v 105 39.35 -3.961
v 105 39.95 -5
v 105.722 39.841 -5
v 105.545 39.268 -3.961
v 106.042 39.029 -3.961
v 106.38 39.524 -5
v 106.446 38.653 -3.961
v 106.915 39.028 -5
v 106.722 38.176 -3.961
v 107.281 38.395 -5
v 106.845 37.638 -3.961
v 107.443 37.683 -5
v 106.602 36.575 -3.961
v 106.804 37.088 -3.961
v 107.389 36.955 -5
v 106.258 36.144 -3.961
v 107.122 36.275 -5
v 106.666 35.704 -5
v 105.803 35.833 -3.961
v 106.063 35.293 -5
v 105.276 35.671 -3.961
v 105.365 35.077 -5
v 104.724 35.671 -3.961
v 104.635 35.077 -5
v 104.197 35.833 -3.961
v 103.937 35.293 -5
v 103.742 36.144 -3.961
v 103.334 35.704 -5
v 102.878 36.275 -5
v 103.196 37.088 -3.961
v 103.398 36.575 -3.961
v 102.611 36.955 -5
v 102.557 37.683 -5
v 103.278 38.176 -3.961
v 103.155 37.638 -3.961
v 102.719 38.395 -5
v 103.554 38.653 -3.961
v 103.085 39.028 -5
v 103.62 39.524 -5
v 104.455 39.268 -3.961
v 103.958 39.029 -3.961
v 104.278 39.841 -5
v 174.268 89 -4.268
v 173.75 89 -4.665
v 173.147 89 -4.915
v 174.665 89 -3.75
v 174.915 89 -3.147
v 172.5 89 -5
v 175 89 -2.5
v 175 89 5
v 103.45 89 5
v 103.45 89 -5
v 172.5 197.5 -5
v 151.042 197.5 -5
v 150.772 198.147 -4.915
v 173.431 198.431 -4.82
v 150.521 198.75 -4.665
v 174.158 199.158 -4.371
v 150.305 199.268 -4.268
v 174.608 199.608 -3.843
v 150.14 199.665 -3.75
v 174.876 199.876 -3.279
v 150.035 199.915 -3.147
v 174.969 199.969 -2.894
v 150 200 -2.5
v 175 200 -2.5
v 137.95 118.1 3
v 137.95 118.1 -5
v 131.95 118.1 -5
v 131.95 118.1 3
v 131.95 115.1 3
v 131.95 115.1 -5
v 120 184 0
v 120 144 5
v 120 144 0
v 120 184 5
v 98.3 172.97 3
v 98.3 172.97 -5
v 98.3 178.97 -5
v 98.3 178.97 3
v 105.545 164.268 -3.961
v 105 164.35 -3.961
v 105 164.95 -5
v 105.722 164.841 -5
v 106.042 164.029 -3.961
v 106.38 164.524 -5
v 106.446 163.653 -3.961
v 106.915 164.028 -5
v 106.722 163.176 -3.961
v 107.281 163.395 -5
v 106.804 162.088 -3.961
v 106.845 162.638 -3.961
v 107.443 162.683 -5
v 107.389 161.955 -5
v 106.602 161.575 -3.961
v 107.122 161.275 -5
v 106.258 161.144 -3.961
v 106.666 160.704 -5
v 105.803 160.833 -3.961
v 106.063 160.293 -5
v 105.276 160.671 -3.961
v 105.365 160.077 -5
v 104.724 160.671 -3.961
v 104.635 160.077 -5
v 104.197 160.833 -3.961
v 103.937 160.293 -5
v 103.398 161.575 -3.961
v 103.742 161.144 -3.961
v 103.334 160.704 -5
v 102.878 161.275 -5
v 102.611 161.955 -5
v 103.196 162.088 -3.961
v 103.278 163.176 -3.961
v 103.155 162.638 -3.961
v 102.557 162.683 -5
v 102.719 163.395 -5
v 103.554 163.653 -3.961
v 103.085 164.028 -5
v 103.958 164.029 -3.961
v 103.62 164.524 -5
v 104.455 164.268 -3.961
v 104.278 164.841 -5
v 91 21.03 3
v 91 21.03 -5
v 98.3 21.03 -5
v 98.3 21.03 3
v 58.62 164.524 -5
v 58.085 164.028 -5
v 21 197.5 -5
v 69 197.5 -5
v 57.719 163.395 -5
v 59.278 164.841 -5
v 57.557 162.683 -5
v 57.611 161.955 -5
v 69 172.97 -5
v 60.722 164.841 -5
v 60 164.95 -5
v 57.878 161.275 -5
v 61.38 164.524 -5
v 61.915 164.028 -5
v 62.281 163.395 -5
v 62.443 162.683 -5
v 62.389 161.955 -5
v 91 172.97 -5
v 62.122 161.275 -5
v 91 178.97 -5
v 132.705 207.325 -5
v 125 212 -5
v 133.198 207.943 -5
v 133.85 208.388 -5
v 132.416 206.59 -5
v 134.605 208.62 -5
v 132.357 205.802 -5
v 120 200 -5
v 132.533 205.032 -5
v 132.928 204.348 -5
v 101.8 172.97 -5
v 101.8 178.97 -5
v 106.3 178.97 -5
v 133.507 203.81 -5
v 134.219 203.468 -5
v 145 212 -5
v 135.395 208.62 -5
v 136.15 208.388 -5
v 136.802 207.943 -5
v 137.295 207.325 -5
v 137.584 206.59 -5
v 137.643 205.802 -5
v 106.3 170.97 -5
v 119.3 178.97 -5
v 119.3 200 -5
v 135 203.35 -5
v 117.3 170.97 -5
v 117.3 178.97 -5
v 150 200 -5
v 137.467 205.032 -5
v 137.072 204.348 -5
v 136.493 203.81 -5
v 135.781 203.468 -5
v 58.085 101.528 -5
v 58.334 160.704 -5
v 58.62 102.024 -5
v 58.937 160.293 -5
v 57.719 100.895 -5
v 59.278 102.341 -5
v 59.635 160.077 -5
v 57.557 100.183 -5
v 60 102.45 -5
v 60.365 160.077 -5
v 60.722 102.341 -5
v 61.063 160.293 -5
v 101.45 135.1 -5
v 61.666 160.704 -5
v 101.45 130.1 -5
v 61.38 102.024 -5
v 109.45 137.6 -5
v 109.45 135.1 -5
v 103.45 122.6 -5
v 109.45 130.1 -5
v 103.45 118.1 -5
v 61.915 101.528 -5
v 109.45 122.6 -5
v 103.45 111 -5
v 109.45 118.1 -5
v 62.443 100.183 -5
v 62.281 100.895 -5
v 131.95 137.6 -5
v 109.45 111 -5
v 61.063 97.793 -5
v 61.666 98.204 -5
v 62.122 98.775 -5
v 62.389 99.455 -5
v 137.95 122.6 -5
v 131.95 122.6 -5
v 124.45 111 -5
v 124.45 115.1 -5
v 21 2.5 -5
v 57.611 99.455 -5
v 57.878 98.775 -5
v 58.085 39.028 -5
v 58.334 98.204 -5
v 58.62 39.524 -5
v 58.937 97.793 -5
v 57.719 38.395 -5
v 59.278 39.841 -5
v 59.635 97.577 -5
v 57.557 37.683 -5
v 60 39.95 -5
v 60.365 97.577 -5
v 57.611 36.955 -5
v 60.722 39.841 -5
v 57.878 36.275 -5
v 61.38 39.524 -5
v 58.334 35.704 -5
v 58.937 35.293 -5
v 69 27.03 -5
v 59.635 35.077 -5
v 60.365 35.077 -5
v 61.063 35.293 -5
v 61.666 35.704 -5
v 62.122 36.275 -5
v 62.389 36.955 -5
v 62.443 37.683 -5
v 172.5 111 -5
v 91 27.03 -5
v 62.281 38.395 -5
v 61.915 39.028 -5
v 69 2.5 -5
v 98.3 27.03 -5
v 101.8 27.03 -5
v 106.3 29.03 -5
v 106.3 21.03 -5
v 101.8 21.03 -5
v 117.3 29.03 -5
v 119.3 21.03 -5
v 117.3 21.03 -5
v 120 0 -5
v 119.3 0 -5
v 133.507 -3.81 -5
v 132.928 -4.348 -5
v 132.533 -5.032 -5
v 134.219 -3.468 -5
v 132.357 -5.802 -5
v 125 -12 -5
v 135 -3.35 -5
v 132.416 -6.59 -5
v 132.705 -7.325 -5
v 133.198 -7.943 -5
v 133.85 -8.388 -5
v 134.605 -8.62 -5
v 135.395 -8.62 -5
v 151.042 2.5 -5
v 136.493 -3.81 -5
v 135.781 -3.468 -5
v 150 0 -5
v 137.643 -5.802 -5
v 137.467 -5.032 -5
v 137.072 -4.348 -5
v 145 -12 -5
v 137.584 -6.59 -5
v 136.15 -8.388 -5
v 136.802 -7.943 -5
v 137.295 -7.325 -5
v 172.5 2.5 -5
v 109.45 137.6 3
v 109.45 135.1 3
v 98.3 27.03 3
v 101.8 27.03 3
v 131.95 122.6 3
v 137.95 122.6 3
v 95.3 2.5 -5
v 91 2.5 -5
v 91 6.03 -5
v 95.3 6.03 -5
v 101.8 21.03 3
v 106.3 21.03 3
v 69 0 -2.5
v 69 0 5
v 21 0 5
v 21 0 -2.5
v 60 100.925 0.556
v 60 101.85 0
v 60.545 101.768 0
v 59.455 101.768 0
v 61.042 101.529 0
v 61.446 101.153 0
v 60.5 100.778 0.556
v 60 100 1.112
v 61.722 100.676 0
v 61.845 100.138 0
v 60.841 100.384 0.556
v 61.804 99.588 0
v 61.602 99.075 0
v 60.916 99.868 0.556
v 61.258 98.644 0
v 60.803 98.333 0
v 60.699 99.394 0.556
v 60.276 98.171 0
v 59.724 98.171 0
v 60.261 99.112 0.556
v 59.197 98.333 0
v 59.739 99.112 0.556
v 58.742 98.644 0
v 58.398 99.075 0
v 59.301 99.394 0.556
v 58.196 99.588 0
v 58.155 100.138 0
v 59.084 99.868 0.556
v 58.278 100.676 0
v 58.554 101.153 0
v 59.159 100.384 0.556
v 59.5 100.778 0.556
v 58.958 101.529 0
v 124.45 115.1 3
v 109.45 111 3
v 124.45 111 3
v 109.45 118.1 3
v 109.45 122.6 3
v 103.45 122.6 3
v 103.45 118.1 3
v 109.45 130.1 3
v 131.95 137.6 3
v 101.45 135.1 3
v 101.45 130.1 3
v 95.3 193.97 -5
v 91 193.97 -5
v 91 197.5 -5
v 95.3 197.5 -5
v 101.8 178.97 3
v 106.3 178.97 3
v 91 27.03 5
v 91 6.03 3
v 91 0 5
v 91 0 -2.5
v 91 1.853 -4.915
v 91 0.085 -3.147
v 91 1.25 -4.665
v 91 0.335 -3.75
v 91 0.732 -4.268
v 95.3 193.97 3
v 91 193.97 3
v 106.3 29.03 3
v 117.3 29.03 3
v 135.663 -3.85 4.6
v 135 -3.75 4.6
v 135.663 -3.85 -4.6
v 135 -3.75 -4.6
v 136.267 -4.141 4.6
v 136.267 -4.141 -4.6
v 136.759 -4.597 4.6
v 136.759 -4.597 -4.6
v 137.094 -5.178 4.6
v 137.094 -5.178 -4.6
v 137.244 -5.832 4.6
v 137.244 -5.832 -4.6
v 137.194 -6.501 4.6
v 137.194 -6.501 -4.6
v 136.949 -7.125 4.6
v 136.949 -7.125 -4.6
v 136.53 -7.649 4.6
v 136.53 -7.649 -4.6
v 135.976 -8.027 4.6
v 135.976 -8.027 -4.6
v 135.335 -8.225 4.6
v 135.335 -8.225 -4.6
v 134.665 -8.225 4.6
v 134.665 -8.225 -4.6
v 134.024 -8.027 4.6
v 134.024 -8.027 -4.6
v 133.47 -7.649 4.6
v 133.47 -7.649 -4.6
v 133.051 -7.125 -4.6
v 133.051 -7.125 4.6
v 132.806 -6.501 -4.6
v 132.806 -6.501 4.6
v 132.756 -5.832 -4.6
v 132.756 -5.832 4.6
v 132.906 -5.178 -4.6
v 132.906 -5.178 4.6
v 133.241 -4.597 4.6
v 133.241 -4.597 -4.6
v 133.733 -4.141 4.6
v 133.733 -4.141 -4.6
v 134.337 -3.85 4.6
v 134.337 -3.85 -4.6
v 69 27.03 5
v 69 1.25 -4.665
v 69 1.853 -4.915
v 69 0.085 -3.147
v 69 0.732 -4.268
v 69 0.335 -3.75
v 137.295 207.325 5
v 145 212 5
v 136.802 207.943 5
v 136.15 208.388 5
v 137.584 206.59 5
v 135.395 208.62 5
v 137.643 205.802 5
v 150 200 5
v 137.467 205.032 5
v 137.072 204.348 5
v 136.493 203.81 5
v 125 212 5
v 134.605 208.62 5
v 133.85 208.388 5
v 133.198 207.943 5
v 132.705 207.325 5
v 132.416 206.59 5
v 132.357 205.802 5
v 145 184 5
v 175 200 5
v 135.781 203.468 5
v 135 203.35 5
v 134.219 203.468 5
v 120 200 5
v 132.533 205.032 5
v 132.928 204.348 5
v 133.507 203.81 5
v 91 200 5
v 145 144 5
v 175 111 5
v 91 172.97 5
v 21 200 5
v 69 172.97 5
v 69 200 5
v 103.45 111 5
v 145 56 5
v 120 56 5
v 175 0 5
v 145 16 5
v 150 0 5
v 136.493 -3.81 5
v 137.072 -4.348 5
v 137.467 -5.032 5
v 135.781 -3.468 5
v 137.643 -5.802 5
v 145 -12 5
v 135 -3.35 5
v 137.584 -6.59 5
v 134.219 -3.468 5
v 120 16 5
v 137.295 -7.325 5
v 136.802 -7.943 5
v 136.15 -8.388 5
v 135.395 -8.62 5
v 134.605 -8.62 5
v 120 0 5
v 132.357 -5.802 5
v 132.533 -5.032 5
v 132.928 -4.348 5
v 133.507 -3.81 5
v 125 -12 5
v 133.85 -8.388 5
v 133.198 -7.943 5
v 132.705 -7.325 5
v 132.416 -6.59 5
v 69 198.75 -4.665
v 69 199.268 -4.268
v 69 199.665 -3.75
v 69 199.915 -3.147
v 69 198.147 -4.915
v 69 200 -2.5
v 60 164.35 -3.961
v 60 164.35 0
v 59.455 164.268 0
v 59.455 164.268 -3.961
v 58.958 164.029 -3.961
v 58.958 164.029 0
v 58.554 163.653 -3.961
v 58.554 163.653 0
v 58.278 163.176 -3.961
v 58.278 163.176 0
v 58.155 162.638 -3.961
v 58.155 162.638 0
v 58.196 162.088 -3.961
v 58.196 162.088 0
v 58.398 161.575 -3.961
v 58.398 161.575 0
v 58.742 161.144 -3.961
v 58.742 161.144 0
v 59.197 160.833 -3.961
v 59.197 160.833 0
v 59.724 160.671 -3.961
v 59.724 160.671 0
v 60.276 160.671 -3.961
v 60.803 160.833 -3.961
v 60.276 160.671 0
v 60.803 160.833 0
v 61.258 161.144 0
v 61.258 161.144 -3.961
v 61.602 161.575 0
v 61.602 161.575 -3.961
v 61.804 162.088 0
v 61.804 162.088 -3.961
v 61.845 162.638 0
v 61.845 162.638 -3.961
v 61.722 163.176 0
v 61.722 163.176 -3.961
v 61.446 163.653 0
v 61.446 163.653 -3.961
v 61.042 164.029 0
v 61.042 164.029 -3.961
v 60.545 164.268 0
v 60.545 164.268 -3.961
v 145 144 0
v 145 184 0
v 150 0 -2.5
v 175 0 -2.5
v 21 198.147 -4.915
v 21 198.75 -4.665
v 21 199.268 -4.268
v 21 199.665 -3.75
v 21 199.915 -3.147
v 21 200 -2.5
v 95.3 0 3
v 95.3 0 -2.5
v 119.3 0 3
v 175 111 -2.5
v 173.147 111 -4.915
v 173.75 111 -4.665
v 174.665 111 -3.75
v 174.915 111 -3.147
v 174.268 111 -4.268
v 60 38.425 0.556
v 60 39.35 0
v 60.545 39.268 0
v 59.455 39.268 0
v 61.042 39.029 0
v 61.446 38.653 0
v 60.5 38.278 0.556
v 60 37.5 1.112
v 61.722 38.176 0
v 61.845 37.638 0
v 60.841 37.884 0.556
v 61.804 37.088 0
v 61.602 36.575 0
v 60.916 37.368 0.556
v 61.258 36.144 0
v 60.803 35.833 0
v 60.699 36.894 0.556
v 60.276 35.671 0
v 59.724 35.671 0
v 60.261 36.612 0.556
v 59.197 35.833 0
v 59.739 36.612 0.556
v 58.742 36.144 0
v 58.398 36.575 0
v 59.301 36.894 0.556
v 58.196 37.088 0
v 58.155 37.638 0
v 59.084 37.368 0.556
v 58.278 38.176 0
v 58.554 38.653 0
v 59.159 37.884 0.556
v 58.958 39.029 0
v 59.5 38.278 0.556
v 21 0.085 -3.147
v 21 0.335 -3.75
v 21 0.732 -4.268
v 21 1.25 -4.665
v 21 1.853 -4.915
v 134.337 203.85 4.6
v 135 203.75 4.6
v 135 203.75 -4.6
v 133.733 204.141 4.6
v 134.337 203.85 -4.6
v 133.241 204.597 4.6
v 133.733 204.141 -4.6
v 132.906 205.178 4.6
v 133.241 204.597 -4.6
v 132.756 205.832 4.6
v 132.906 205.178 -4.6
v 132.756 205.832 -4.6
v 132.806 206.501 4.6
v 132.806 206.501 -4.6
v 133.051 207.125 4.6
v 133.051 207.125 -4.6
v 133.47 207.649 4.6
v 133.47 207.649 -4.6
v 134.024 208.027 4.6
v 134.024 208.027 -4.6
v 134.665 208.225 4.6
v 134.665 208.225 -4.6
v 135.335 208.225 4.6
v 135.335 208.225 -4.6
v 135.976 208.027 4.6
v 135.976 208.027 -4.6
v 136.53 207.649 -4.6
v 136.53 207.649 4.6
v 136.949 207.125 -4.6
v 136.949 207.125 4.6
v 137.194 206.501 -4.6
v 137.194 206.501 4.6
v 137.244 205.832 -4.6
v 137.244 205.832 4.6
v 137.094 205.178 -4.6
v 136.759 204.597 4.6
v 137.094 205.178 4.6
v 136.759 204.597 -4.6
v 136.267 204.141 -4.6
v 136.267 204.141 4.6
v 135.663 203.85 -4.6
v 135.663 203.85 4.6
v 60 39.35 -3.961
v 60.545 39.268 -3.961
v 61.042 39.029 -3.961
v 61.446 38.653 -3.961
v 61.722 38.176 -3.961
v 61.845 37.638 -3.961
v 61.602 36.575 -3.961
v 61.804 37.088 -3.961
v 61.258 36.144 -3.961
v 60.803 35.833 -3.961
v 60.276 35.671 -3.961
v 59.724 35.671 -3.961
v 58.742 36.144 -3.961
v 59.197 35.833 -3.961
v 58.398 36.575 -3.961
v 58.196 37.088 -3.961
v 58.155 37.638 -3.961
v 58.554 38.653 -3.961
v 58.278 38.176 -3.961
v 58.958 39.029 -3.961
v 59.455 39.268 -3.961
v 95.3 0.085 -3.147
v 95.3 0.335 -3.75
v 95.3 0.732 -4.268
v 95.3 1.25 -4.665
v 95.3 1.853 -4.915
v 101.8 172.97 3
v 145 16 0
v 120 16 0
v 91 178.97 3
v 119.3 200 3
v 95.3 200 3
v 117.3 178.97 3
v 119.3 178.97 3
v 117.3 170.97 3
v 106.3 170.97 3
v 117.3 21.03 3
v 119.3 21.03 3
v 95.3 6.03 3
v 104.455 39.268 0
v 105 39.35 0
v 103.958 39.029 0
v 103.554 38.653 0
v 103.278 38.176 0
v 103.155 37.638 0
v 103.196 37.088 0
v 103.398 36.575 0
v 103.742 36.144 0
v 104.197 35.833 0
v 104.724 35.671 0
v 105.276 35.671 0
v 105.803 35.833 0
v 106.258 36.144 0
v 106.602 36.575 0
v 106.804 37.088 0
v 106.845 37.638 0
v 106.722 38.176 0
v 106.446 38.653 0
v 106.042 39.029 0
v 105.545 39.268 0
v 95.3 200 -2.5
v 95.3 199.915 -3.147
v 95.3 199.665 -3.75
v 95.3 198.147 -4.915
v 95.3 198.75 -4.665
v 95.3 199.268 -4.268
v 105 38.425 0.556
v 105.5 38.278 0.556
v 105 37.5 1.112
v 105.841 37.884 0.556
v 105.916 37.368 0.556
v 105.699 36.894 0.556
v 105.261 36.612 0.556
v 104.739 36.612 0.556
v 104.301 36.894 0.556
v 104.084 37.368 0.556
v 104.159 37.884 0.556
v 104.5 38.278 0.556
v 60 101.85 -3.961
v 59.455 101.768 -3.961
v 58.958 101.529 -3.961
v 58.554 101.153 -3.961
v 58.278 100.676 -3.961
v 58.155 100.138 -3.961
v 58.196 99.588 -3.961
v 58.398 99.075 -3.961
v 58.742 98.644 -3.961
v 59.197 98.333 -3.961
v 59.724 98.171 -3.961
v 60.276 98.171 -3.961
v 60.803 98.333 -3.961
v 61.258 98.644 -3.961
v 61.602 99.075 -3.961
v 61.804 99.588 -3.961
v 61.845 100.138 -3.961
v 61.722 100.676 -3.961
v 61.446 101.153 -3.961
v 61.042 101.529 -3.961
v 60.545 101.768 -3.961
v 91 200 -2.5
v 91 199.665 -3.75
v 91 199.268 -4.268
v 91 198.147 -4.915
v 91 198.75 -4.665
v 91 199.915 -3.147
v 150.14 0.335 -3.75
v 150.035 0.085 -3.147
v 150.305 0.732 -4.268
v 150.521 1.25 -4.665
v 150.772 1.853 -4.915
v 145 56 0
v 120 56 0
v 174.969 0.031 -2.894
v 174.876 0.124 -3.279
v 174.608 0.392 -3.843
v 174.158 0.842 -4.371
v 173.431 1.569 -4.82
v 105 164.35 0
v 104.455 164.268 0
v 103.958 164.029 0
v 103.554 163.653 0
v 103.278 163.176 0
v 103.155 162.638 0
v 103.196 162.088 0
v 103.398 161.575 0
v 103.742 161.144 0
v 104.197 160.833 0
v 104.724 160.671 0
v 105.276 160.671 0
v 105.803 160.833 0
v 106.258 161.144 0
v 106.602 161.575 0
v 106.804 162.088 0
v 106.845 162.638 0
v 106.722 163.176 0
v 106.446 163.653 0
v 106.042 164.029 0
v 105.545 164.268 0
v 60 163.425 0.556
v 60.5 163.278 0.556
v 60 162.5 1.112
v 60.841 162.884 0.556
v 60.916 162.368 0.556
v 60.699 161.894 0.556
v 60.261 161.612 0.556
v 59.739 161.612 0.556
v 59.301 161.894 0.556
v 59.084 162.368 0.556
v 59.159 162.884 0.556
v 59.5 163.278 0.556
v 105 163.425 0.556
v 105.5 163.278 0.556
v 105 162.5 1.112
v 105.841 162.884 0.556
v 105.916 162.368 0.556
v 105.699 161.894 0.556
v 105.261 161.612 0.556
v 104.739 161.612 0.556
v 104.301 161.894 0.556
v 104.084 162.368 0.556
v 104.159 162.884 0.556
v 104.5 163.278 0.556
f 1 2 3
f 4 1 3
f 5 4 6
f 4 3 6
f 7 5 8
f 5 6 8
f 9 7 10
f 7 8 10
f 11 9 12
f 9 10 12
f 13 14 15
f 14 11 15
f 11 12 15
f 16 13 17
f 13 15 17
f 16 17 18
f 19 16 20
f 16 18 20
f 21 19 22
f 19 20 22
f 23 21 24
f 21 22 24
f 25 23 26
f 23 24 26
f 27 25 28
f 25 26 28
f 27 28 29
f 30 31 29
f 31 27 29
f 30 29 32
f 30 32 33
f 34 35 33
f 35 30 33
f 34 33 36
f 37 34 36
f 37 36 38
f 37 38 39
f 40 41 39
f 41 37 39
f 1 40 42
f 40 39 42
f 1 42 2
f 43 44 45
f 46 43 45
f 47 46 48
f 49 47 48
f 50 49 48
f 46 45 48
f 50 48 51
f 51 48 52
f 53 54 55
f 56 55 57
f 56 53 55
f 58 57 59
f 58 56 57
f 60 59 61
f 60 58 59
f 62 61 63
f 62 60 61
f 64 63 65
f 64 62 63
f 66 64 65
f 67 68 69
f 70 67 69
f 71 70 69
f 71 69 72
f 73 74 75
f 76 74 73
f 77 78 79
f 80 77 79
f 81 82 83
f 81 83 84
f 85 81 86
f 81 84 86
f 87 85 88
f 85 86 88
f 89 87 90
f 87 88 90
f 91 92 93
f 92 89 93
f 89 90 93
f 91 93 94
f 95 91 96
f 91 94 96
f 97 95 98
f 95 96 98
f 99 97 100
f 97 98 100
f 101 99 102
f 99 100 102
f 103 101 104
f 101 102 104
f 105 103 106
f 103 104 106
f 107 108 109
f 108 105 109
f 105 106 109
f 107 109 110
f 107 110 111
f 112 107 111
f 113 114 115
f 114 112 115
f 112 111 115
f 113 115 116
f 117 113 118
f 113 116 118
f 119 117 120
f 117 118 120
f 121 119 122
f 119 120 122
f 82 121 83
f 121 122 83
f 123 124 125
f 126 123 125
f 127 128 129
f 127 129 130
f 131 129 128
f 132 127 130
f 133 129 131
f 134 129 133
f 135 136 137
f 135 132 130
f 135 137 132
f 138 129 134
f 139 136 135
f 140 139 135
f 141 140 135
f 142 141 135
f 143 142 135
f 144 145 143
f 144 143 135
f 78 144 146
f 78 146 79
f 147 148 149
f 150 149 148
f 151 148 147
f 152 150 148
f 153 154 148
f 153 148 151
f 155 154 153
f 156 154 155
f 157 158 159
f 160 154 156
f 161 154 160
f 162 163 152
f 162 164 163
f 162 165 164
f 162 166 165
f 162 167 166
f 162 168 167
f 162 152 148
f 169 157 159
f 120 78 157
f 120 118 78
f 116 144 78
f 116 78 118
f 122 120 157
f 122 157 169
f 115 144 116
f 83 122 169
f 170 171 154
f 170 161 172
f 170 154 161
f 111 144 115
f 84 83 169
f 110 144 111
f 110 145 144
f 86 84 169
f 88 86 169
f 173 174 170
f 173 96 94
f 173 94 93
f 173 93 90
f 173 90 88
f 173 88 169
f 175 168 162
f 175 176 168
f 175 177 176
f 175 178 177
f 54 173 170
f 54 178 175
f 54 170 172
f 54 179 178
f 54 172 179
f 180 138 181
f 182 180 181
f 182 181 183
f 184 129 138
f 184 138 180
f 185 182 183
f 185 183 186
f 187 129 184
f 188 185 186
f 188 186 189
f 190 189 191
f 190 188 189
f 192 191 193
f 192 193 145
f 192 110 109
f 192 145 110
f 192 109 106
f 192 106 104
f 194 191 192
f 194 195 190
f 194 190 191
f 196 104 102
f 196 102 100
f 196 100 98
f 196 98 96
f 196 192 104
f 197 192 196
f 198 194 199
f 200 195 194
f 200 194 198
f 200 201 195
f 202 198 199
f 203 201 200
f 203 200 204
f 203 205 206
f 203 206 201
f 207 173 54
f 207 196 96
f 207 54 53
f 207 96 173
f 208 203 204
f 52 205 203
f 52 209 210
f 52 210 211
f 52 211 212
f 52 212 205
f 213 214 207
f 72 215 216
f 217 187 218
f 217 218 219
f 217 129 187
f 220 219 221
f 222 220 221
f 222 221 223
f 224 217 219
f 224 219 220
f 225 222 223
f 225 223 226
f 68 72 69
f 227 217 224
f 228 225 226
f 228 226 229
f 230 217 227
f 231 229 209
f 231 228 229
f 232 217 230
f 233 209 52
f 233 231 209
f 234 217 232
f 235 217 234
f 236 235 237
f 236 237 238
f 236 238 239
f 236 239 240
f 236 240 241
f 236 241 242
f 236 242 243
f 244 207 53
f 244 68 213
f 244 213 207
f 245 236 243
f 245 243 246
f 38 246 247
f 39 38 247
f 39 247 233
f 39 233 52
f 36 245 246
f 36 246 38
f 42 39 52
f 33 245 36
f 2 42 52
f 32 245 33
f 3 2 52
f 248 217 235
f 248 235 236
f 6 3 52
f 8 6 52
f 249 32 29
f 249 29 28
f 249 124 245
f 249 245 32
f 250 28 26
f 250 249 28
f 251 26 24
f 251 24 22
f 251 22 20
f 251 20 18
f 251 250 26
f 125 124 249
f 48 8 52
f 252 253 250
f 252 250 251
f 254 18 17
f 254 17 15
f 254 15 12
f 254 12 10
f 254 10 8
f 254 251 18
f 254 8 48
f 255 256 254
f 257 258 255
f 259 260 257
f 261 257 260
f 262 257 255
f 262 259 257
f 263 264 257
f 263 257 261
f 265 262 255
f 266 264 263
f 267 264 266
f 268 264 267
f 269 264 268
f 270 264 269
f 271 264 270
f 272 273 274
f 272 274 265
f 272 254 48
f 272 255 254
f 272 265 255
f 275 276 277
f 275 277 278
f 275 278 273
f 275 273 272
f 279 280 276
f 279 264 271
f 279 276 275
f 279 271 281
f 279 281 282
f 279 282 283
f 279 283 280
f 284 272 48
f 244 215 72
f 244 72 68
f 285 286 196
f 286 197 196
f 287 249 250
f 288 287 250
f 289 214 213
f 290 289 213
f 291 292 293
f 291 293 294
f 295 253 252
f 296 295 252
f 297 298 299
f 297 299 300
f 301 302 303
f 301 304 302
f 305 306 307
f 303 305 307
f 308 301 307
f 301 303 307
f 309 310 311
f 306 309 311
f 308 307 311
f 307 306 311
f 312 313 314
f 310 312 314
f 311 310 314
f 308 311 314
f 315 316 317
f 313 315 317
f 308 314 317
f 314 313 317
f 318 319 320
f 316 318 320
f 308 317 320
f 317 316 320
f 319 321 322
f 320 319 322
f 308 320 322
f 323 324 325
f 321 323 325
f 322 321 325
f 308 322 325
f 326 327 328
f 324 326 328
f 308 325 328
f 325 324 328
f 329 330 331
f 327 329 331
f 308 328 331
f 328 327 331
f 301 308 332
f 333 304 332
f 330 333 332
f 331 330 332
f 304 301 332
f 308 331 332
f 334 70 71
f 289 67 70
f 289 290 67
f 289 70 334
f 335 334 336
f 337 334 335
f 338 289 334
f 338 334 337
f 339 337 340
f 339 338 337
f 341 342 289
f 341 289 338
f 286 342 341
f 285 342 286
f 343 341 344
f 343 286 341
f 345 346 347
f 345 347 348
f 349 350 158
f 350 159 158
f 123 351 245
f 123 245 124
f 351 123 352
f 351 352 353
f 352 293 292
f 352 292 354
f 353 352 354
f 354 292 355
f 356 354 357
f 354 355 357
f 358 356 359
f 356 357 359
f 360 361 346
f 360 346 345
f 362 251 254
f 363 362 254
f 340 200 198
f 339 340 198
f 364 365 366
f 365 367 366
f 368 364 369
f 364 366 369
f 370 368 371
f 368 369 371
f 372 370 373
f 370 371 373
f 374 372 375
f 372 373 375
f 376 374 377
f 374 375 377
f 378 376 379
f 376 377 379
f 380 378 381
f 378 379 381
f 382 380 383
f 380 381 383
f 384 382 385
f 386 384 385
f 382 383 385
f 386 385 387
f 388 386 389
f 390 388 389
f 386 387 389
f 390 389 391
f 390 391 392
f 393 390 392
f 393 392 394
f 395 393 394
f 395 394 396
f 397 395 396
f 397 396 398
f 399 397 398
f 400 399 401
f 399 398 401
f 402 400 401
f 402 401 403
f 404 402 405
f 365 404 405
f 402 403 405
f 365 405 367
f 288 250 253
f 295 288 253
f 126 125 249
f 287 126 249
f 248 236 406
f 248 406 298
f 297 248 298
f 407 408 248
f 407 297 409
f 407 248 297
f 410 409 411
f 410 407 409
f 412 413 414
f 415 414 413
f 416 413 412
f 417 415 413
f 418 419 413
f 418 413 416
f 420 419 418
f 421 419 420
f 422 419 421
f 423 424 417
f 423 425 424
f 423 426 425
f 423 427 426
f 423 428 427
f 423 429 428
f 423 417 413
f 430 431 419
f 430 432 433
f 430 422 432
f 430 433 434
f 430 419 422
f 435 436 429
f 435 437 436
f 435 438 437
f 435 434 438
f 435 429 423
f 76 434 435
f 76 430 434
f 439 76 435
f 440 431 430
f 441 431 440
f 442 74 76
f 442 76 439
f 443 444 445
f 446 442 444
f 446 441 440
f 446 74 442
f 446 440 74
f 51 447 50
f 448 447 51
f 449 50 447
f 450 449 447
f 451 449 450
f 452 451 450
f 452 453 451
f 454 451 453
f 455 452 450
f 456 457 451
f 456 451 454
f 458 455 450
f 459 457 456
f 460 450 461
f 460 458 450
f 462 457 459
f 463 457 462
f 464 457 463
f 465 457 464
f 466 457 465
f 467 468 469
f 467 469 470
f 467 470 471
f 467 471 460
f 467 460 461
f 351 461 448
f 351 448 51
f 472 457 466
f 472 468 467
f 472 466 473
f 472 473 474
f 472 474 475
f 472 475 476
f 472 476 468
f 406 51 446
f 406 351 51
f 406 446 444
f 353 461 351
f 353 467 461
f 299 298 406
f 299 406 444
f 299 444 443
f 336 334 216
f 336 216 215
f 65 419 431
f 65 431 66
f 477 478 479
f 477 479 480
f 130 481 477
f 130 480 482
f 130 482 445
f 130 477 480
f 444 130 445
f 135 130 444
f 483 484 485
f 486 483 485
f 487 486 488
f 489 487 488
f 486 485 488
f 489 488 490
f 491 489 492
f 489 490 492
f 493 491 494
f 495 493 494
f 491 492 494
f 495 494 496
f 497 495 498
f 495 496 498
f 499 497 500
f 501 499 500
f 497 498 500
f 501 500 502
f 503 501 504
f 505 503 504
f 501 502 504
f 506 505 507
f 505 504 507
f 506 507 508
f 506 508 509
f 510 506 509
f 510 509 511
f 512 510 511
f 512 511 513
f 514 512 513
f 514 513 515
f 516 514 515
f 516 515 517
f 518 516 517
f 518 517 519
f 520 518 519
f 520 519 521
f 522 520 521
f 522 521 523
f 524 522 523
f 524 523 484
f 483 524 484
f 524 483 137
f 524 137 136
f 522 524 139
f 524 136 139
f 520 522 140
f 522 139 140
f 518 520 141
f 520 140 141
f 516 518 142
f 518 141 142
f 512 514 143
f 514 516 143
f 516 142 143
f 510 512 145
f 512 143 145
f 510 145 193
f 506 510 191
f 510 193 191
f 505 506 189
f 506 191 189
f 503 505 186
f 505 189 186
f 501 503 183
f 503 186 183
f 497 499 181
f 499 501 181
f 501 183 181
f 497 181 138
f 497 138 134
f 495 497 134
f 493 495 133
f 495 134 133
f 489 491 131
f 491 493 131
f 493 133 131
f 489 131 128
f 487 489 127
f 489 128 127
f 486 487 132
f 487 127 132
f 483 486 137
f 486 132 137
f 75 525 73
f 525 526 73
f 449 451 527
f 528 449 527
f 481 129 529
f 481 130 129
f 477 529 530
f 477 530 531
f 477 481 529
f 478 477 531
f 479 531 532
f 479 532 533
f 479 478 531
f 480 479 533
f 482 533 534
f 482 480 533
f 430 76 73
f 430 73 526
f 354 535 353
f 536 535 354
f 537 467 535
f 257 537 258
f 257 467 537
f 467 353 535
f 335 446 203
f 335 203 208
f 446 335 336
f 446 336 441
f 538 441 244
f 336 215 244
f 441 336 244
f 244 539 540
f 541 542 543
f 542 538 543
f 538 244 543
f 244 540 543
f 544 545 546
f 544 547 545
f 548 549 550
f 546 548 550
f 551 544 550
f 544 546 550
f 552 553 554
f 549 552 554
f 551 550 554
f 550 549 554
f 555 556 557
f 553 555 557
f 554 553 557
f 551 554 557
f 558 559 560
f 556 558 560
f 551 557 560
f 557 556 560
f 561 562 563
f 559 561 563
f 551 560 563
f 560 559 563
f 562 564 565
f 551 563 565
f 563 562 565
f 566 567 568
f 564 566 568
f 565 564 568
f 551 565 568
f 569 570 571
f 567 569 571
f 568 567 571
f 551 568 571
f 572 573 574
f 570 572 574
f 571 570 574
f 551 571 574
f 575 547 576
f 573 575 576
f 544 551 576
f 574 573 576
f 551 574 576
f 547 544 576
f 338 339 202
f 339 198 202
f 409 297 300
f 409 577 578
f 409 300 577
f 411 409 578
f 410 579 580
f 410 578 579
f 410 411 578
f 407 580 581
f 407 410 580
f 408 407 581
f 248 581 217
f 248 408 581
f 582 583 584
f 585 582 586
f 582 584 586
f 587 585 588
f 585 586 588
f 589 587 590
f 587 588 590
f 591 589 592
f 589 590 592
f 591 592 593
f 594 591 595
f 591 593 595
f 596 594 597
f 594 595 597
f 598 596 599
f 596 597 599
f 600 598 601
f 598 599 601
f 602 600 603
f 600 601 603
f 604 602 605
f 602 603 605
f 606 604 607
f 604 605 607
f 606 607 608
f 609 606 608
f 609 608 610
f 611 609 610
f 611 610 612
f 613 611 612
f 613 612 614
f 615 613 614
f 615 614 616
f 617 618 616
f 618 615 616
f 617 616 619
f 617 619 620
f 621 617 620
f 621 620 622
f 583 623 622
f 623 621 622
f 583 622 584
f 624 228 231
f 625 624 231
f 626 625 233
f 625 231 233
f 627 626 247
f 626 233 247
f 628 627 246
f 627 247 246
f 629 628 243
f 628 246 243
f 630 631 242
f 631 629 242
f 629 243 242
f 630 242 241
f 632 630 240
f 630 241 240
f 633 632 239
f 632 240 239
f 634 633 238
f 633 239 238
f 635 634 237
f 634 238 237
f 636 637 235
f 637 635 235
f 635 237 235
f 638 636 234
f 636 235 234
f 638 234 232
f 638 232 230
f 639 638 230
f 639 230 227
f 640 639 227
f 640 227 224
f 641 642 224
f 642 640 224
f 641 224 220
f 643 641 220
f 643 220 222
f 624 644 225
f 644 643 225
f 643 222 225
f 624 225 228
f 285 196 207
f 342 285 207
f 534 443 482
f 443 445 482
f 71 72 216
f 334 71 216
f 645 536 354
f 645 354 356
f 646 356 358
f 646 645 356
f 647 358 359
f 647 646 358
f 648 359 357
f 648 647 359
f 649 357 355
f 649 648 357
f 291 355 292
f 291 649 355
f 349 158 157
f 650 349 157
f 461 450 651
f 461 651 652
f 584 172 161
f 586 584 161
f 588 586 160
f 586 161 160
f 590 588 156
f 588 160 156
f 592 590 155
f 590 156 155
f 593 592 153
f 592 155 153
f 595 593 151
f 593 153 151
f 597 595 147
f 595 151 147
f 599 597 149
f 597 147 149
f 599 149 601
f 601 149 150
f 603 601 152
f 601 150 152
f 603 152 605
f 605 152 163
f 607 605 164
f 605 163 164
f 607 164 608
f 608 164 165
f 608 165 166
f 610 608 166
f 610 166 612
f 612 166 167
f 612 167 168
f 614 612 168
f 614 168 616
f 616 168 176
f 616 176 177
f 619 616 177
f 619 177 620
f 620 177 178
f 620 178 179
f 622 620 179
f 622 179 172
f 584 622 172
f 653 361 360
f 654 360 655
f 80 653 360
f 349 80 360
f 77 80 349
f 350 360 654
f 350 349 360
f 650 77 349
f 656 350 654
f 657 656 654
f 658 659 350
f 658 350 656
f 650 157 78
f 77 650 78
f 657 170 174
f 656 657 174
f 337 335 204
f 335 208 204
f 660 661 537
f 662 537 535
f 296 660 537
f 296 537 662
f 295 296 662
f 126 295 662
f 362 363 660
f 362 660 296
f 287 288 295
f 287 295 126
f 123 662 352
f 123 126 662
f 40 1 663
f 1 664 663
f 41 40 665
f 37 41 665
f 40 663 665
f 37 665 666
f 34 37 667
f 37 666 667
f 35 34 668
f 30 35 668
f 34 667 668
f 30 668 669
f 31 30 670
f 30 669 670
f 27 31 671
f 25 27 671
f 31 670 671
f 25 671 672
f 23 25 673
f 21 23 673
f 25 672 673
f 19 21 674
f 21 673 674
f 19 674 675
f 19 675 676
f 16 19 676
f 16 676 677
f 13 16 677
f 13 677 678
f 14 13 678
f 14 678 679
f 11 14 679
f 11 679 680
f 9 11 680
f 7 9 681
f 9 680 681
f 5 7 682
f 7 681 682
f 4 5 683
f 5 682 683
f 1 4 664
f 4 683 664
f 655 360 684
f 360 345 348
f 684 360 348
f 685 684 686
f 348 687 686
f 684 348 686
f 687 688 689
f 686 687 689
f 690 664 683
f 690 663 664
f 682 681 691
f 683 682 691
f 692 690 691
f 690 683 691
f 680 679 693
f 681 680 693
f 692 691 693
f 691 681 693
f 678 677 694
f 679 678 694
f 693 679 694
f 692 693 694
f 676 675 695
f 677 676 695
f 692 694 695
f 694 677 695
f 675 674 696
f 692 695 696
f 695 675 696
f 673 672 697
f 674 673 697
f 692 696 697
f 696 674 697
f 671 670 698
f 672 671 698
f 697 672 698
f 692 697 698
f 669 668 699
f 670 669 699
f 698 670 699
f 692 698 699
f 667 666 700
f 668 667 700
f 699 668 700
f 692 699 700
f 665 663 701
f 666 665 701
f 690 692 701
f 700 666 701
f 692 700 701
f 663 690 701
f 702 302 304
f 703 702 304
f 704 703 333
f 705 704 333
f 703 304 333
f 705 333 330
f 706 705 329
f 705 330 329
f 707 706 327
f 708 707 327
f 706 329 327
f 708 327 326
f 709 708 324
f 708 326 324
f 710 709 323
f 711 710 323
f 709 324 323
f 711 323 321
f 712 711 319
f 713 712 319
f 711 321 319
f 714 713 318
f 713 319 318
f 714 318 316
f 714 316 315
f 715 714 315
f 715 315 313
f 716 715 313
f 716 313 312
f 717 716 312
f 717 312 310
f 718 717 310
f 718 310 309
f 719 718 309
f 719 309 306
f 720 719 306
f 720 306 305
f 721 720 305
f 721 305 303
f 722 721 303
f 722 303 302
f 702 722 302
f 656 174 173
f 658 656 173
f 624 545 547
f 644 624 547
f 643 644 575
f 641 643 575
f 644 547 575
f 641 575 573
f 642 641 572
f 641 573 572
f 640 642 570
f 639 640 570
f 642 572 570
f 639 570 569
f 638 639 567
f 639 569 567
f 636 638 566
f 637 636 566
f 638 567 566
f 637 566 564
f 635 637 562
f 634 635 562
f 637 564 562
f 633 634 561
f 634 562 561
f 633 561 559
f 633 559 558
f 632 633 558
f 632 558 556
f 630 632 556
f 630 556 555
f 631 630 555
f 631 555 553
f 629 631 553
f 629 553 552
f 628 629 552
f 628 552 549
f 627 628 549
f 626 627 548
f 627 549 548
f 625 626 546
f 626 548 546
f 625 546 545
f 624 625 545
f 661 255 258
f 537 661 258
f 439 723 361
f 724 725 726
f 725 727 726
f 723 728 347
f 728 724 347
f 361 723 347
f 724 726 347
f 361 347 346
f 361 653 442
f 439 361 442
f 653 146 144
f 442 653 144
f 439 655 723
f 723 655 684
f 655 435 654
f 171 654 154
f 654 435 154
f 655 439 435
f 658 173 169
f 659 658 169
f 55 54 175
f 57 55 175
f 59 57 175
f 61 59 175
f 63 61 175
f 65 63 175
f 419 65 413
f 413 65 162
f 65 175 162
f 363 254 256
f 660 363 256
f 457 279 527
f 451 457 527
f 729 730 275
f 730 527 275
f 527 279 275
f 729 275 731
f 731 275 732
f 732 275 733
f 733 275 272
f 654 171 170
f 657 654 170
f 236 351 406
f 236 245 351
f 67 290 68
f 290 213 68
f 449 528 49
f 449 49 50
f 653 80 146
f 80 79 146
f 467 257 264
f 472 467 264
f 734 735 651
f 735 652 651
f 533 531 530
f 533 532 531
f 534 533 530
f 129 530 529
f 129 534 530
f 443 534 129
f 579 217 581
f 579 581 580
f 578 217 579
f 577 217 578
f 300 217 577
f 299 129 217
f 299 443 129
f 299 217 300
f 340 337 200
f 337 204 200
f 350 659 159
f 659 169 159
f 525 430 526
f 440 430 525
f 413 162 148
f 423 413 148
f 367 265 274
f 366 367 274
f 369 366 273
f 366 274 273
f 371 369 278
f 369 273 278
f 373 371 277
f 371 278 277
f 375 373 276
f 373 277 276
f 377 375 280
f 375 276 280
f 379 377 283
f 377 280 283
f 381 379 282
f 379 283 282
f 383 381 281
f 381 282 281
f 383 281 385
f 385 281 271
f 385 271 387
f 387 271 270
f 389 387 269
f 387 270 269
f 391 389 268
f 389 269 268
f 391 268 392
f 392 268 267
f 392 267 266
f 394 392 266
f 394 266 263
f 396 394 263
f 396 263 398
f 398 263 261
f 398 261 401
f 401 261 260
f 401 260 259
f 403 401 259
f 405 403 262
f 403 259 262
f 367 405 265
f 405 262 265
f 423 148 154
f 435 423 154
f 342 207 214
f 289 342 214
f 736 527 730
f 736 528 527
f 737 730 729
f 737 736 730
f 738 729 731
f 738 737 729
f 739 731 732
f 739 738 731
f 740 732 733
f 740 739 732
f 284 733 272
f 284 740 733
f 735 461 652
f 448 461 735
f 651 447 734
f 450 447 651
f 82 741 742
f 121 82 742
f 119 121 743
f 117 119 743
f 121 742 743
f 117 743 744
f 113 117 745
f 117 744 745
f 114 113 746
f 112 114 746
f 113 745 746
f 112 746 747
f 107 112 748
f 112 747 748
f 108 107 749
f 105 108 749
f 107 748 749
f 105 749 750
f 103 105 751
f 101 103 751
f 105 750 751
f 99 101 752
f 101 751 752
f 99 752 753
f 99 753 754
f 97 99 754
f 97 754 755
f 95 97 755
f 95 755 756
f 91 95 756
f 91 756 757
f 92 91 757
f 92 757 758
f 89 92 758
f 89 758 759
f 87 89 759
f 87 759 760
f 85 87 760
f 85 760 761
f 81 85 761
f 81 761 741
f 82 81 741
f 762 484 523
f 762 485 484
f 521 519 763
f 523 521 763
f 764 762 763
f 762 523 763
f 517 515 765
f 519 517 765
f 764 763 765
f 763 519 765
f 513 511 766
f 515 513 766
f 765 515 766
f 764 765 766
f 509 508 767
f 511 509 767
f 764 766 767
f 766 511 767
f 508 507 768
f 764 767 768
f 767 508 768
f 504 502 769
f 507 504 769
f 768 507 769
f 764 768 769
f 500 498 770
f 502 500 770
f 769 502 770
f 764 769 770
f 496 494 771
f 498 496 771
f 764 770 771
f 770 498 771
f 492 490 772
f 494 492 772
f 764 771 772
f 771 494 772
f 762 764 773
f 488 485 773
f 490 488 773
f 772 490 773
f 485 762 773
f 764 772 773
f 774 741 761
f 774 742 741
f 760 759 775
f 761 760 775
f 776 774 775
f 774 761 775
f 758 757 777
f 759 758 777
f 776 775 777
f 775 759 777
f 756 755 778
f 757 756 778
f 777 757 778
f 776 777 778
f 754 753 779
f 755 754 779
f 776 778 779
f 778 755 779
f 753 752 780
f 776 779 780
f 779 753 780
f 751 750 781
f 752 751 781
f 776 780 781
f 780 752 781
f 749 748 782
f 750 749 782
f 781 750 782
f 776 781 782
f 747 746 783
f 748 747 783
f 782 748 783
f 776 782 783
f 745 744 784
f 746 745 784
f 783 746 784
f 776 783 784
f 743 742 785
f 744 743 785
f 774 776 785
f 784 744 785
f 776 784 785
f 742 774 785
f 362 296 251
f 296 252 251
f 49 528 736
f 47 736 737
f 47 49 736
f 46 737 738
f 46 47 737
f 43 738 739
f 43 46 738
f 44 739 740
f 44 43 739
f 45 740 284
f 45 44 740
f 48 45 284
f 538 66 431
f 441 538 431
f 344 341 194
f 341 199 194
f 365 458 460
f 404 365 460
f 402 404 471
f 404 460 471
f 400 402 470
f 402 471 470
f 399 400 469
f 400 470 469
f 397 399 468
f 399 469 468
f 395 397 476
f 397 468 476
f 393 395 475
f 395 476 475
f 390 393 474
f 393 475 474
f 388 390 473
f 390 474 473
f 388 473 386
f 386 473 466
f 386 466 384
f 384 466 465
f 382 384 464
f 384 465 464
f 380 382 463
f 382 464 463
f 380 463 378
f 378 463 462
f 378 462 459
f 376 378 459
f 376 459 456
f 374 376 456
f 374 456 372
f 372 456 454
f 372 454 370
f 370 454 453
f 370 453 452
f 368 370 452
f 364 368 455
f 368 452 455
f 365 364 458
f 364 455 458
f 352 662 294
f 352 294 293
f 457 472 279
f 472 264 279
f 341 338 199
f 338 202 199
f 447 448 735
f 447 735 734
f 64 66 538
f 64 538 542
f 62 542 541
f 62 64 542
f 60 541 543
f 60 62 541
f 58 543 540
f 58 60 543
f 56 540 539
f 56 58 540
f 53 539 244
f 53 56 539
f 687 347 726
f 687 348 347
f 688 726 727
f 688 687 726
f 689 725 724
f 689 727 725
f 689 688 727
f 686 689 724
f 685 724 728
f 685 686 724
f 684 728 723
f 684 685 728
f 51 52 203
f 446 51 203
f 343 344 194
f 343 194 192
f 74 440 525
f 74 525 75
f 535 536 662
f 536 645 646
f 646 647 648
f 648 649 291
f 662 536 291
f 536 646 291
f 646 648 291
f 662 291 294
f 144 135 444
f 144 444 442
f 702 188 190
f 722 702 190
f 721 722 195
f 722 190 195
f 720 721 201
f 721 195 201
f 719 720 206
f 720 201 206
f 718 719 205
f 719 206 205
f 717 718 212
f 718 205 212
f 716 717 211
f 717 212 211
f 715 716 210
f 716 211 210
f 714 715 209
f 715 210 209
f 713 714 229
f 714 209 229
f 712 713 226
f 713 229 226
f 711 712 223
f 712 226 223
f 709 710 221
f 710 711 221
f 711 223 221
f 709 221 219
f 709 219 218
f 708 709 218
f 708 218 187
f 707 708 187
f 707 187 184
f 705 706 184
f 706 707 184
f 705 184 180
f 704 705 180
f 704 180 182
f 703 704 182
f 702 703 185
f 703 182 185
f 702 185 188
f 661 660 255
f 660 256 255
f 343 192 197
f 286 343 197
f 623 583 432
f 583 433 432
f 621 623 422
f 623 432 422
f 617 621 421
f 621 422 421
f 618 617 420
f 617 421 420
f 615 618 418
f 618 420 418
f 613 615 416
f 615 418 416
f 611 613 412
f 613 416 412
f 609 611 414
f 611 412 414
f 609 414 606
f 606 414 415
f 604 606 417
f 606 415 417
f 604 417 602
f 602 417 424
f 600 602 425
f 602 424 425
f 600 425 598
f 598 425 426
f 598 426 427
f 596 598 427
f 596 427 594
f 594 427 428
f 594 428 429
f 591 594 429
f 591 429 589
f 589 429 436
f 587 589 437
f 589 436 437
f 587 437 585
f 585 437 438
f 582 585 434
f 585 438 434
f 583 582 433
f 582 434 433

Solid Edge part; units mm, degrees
sketch "Sketch1" plane through (0, 0, 0) normal (0, -1, 0) x (1, 0, 0)
  line L0 (-175, -5) -> (175, -5)
  line L1 (175, -5) -> (175, 5)
  line L2 (175, 5) -> (-175, 5)
  line L3 (-175, 5) -> (-175, -5)
  dimension "D1" = 350
  dimension "D2" = 10
extrude "Protrusion1" add sketch "Sketch1" against normal blind 200
sketch "Sketch2" plane through (0, 100, -5) normal (0, 0, -1) x (1, 0, 0)
  line L0 (-21.8, 78.97) -> (-21.8, 72.97)
  line L1 (-21.8, 72.97) -> (-18.3, 72.97)
  line L2 (-18.3, 72.97) -> (-18.3, 78.97)
  line L3 (-18.3, 78.97) -> (-15.3, 78.97)
  line L4 (-15.3, 78.97) -> (-10.3, 78.97)
  line L5 (-10.3, 78.97) -> (-10.3, 93.97)
  line L6 (-10.3, 93.97) -> (-15.3, 93.97)
  line L7 (-15.3, 93.97) -> (-15.3, 101.97)
  line L8 (-15.3, 101.97) -> (-18.3, 101.97)
  line L9 (-18.3, 101.97) -> (-18.3, 107.97)
  line L10 (-18.3, 107.97) -> (-21.8, 107.97)
  line L11 (-21.8, 107.97) -> (-21.8, 101.97)
  line L12 (-21.8, 101.97) -> (-39.3, 101.97)
  line L13 (-39.3, 101.97) -> (-39.3, 78.97)
  line L14 (-39.3, 78.97) -> (-37.3, 78.97)
  line L15 (-37.3, 78.97) -> (-37.3, 70.97)
  line L16 (-37.3, 70.97) -> (-26.3, 70.97)
  line L17 (-26.3, 70.97) -> (-26.3, 78.97)
  line L18 (-26.3, 78.97) -> (-21.8, 78.97)
  dimension "D1" = 23
  dimension "D2" = 6
  dimension "D3" = 3
  dimension "D4" = 5
  dimension "D5" = 24
  dimension "D6" = 15
  dimension "D7" = 1.97
  dimension "D8" = 10.3
  dimension "D9" = 17.5
  dimension "D10" = 8
  dimension "D11" = 11
  dimension "D12" = 2
extrude "Cutout1" cut sketch "Sketch2" against normal blind 8
sketch "Sketch3" plane through (0, 100, -5) normal (0, 0, -1) x (1, 0, 0)
  line L0 (11, 72.97) -> (-11, 72.97)
  line L1 (-11, 111.97) -> (-11, 72.97)
  line L2 (11, 111.97) -> (-11, 111.97)
  line L3 (11, 111.97) -> (11, 72.97)
  dimension "D1" = 22
  dimension "D2" = 0.7
  dimension "D3" = 39
  dimension "D4" = 6
extrude "Cutout2" cut sketch "Sketch3" against normal through all
mirror "Mirror1" about plane through (0, 100, 0) normal (0, -1, 0) of "Cutout1", "Cutout2"
mirror "Mirror2" about plane through (40, 0, 0) normal (1, 0, 0) of "Mirror1", "Cutout2", "Cutout1"
mirror "Mirror3" about plane through (-40, 0, 0) normal (1, 0, 0) of "Cutout2", "Cutout1", "Mirror1"
sketch "Sketch4" plane through (0, 100, -5) normal (0, 0, -1) x (0, -1, 0)
  line L0 (-22.6, 109.45) -> (-22.6, 103.45)
  line L1 (-22.6, 103.45) -> (-18.1, 103.45)
  line L2 (-18.1, 103.45) -> (-18.1, 109.45)
  line L3 (-18.1, 109.45) -> (-15.1, 109.45)
  line L4 (-15.1, 109.45) -> (-11, 109.45)
  line L5 (-11, 109.45) -> (-11, 124.45)
  line L6 (-11, 124.45) -> (-15.1, 124.45)
  line L7 (-15.1, 124.45) -> (-15.1, 131.95)
  line L8 (-15.1, 131.95) -> (-18.1, 131.95)
  line L9 (-18.1, 131.95) -> (-18.1, 137.95)
  line L10 (-18.1, 137.95) -> (-22.6, 137.95)
  line L11 (-22.6, 137.95) -> (-22.6, 131.95)
  line L12 (-22.6, 131.95) -> (-37.6, 131.95)
  line L13 (-37.6, 131.95) -> (-37.6, 109.45)
  line L14 (-37.6, 109.45) -> (-35.1, 109.45)
  line L15 (-35.1, 109.45) -> (-35.1, 101.45)
  line L16 (-35.1, 101.45) -> (-30.1, 101.45)
  line L17 (-30.1, 101.45) -> (-30.1, 109.45)
  line L18 (-30.1, 109.45) -> (-22.6, 109.45)
  dimension "D1" = 6
  dimension "D2" = 3
  dimension "D3" = 4.1
  dimension "D4" = 22.5
  dimension "D5" = 15
  dimension "D6" = 22.5
  dimension "D7" = 103.45
  dimension "D8" = 11
  dimension "D9" = 15
  dimension "D10" = 8
  dimension "D11" = 5
  dimension "D12" = 2.5
  dimension "D13" = 15
extrude "Cutout3" cut sketch "Sketch4" against normal up to vertex (8 mm away)
sketch "Sketch5" plane through (0, 100, -5) normal (0, 0, -1) x (0, -1, 0)
  line L0 (-11, 109.45) -> (-11, 103.45)
  line L1 (-11, 103.45) -> (11, 103.45)
  line L2 (11, 103.45) -> (11, 175)
  line L3 (11, 175) -> (-11, 175)
  line L4 (-11, 175) -> (-11, 109.45)
  dimension "D1" = 6
  dimension "D2" = 22
extrude "Cutout4" cut sketch "Sketch5" against normal through all
mirror "Mirror4" about plane through (0, 0, 0) normal (1, 0, 0) of "Cutout4", "Cutout3"
sketch "Sketch6" plane through (0, 100, -5) normal (0, 0, -1) x (1, 0, 0)
  circle A0 centre (-97.5, 62.5) radius 1.875
  circle A1 centre (-52.5, 62.5) radius 1.875
  circle A2 centre (-52.5, 0) radius 1.875
  circle A3 centre (-97.5, -62.5) radius 1.875
  circle A4 centre (-52.5, -62.5) radius 1.875
  dimension "D1" = 195
  dimension "D2" = 125
  dimension "D3" = 3.75
  dimension "D4" = 45
extrude "Cutout5" cut sketch "Sketch6" against normal blind 7
sketch "Sketch7" plane through (0, 100, 5) normal (0, 0, 1) x (1, 0, 0)
  line L0 (-120, 84) -> (-120, 44)
  line L1 (-120, 44) -> (-145, 44)
  line L2 (-145, 44) -> (-145, 84)
  line L3 (-145, 84) -> (-120, 84)
  dimension "D1" = 40
  dimension "D2" = 25
  dimension "D3" = 15
  dimension "D4" = 30
extrude "Cutout6" cut sketch "Sketch7" against normal blind 5
mirror "Mirror5" about plane through (0, 100, 0) normal (0, -1, 0) of "Cutout6"
mirror "Mirror6" about plane through (0, 0, 0) normal (1, 0, 0) of "Cutout6", "Mirror5"
sketch "Sketch8" plane through (0, 100, 5) normal (0, 0, 1) x (1, 0, 0)
  line L0 (21, 100) -> (21, -100)
  dimension "D1" = 10
extrude "Cutout7" cut sketch "Sketch8" against normal through all material side at (20.95, 100, 5)
hole "Hole_11" at (105, 37.5, -5) direction (0, 0, 1) diameter 3.7 depth 5 tip angle 118 start chamfer 0.6 start chamfer angle 30 end chamfer 0.6 end chamfer angle 30
hole "Hole1" at (105, 162.5, -5) direction (0, 0, 1) diameter 3.7 depth 5 tip angle 118 start chamfer 0.6 start chamfer angle 30 end chamfer 0.6 end chamfer angle 30
hole "Hole2" at (60, 37.5, -5) direction (0, 0, 1) diameter 3.7 depth 5 tip angle 118 start chamfer 0.6 start chamfer angle 30 end chamfer 0.6 end chamfer angle 30
hole "Hole3" at (60, 100, -5) direction (0, 0, 1) diameter 3.7 depth 5 tip angle 118 start chamfer 0.6 start chamfer angle 30 end chamfer 0.6 end chamfer angle 30
hole "Hole4" at (60, 162.5, -5) direction (0, 0, 1) diameter 3.7 depth 5 tip angle 118 start chamfer 0.6 start chamfer angle 30 end chamfer 0.6 end chamfer angle 30
sketch "Sketch9" plane through (98, 100, -5) normal (0, 0, -1) x (1, 0, 0)
  line L0 (22, 100) -> (27, 112)
  line L1 (27, 112) -> (47, 112)
  line L2 (47, 112) -> (52, 100)
  line L3 (52, 100) -> (22, 100)
  dimension "D1" = 30
  dimension "D2" = 20
  dimension "D3" = 12
  dimension "D4" = 120
extrude "Protrusion2" add sketch "Sketch9" against normal up to vertex (10 mm away)
hole "Hole_16" at (135, -6, -5) direction (0, 0, 1) diameter 4.5 end up to next start chamfer 0.4 start chamfer angle 45 end chamfer 0.4 end chamfer angle 45
mirror "Mirror7" about plane through (0, 100, 0) normal (0, -1, 0) of "Protrusion2", "Hole_16"
fillet "Round1" radius 2.5 8 edges at (45, 200, -5) (93.15, 200, -5) (162.5, 200, -5) (175, 155.5, -5) (175, 44.5, -5) (162.5, 0, -5) (93.15, 0, -5) (45, 0, -5)
properties material "Nylon, allgemein"
